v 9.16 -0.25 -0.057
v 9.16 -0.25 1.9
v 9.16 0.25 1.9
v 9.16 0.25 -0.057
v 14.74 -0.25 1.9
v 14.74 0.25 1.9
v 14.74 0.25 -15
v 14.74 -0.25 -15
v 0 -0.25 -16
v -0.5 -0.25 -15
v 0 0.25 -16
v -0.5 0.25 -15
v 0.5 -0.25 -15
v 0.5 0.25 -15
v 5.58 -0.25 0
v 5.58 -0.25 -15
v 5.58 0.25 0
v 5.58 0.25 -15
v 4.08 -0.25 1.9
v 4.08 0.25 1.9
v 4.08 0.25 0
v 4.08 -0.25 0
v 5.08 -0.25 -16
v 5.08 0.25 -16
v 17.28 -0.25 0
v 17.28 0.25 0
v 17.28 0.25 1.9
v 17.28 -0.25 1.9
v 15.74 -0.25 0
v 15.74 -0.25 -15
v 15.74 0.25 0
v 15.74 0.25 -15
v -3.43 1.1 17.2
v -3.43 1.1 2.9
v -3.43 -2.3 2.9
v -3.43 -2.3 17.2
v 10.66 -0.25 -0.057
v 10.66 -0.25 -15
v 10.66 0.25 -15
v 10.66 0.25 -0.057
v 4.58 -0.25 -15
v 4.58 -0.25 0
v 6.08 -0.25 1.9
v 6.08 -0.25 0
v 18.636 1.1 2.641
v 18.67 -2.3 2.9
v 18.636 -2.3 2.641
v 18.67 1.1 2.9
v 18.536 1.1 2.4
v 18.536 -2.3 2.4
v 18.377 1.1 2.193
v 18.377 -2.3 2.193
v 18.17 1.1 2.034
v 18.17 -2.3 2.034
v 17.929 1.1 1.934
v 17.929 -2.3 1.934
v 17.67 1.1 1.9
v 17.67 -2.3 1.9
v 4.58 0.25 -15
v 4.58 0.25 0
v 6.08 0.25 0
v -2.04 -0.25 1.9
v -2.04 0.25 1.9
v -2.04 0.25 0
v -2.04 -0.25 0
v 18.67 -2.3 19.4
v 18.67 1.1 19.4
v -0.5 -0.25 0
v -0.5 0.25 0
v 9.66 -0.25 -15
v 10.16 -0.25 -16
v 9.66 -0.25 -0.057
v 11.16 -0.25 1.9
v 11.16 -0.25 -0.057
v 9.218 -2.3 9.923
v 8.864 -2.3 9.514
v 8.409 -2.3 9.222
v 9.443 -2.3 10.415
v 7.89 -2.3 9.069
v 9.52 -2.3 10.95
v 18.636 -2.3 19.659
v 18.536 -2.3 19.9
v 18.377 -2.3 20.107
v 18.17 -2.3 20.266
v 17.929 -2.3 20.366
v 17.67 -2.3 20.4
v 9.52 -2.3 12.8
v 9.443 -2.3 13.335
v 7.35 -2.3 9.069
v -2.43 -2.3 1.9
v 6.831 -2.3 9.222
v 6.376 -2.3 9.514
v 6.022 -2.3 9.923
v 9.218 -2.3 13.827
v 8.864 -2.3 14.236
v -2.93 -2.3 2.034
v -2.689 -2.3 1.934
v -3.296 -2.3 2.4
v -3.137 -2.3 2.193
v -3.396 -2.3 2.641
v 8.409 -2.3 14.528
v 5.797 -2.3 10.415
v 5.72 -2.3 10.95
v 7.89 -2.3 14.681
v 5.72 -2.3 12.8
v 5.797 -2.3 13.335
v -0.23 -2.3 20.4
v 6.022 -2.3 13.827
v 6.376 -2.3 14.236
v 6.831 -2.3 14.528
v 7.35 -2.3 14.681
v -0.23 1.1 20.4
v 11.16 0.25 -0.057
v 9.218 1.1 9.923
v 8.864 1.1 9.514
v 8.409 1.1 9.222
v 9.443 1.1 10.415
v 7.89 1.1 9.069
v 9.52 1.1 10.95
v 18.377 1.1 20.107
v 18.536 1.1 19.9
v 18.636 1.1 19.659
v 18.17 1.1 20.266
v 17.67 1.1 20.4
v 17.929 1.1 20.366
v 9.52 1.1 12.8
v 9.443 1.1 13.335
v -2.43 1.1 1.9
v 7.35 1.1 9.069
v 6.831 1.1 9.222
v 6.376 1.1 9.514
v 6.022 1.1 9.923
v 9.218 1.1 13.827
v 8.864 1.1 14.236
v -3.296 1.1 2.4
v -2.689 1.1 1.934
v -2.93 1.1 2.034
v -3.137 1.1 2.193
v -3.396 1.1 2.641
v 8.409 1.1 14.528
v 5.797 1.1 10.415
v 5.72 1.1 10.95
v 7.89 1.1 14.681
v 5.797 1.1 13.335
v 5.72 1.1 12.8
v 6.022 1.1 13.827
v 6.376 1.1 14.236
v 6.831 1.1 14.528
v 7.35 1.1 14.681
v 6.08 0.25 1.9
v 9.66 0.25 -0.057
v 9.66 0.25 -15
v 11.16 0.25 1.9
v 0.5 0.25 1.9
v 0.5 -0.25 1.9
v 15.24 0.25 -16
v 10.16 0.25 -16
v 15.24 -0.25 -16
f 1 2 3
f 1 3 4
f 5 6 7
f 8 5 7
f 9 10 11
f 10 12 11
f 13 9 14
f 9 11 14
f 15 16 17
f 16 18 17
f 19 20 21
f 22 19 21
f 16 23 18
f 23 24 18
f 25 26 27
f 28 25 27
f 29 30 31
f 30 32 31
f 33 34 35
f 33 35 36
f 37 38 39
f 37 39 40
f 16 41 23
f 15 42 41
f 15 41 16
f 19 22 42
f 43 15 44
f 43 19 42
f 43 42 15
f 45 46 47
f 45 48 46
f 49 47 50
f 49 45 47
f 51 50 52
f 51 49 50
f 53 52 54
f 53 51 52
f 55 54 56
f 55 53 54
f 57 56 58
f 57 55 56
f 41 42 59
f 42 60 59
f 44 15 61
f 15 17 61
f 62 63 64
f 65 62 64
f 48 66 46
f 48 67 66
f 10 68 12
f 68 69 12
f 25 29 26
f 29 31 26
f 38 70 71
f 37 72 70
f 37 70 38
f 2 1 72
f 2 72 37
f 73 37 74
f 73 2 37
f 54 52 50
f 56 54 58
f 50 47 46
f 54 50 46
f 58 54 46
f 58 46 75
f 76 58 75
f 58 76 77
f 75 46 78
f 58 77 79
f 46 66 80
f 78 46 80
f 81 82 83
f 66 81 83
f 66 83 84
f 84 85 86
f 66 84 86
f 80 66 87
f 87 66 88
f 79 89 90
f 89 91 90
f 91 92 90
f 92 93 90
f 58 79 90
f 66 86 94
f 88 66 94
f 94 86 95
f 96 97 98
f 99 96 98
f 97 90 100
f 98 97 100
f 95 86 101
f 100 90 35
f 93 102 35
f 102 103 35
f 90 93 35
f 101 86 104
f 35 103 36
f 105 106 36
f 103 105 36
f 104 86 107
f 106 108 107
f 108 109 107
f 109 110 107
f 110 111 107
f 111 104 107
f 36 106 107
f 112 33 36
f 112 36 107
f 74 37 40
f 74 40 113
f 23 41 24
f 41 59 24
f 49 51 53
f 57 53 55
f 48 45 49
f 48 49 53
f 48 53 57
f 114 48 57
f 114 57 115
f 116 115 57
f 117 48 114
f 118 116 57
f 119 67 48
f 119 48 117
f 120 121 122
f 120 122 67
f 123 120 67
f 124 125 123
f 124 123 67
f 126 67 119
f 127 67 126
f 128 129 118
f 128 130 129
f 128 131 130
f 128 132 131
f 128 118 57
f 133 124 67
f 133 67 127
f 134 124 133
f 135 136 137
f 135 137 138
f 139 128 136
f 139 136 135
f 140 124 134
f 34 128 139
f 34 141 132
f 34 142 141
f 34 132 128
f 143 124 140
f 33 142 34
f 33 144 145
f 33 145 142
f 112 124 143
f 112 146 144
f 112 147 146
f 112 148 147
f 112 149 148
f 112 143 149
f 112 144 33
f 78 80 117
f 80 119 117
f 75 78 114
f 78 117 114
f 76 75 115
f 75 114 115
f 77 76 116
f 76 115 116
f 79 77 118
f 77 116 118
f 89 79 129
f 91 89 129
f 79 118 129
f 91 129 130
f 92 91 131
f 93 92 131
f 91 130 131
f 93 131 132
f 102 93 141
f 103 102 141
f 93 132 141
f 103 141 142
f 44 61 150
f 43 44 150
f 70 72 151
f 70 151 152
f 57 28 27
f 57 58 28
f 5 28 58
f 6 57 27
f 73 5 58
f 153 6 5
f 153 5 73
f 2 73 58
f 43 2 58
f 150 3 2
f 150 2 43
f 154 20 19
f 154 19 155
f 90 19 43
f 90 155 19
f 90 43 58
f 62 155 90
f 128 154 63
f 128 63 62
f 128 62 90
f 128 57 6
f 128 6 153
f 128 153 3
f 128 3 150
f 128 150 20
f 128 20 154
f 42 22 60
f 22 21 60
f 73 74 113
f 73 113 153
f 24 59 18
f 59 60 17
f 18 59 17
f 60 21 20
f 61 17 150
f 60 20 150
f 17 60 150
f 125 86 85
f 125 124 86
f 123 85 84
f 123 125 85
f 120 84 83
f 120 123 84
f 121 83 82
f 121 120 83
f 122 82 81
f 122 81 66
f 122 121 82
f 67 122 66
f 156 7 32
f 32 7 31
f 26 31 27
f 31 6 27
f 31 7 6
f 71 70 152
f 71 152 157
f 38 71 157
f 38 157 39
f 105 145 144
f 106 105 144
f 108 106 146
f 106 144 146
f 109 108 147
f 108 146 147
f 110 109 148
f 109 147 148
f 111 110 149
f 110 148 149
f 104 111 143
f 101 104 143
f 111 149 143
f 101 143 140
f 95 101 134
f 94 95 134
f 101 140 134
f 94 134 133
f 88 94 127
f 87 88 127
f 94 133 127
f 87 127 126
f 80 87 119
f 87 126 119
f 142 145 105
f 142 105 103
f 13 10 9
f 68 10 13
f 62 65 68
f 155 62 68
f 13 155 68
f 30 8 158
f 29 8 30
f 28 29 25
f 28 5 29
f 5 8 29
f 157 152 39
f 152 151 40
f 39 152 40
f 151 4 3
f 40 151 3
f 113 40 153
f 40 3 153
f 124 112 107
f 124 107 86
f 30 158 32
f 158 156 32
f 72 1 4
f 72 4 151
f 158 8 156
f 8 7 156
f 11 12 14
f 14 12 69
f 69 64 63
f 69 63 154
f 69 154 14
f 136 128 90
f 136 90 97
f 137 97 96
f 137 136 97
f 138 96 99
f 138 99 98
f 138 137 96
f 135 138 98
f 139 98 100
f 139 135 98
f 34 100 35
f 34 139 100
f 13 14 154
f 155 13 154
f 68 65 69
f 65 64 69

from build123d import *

# Parameters (mm, degrees)
PAD_DEPTH         = 0.25
PAD001_DEPTH      = 1.1
PAD001_DEPTH_BACK = 2.3


with BuildPart() as pad:
    # Sketch → Pad (new body, symmetric)
    with BuildSketch(Plane.XZ):
        Polygon((-2.04, 2), (-2.04, 0), (-0.5, 0), (-0.5, -15), (0, -16), (0.5, -15), (0.5, 2), align=None)
        Polygon((14.74, 2), (14.74, -15), (15.24, -16), (15.74, -15), (15.74, 0), (17.28, 0), (17.28, 2), align=None)
        Polygon((4.08, 2), (4.08, 0), (4.58, 0), (4.58, -15), (5.08, -16), (5.58, -15), (5.58, 0), (6.08, 0), (6.08, 2), align=None)
        Polygon((9.16, 2), (9.16, -0.056881), (9.66, -0.056881), (9.66, -15), (10.16, -16), (10.66, -15), (10.66, -0.056881), (11.16, -0.056881), (11.16, 2), align=None)
    extrude(amount=PAD_DEPTH, both=True)


with BuildPart() as diode_bridge_vishay_gbu:
    # Sketch001 → Pad001 (new body, two sides)
    with BuildSketch(Plane(origin=(15.24, 0, 0), x_dir=(-1, 0, 0), z_dir=(0, 1, 0))) as pad001_sk:
        with BuildLine():
            Line((-2.43, 1.9), (17.67, 1.9))
            ThreePointArc((17.67, 1.9), (18.377107, 2.192893), (18.67, 2.9))
            Line((18.67, 2.9), (18.67, 17.2))
            Line((18.67, 17.2), (15.47, 20.4))
            Line((15.47, 20.4), (-2.43, 20.4))
            ThreePointArc((-2.43, 20.4), (-3.137107, 20.107107), (-3.43, 19.4))
            Line((-3.43, 19.4), (-3.43, 2.9))
            ThreePointArc((-3.43, 2.9), (-3.137107, 2.192893), (-2.43, 1.9))
        make_face()
        with BuildLine():
            ThreePointArc((9.52, 12.8), (7.62, 14.7), (5.72, 12.8))
            Line((5.72, 12.8), (5.72, 10.95))
            ThreePointArc((5.72, 10.95), (7.62, 9.05), (9.52, 10.95))
            Line((9.52, 12.8), (9.52, 10.95))
        make_face(mode=Mode.SUBTRACT)
    extrude(amount=PAD001_DEPTH)
    extrude(pad001_sk.sketch, amount=-PAD001_DEPTH_BACK)

    # Pad001_mp_cp: union Pad
    add(pad.part)


solid = diode_bridge_vishay_gbu.part
